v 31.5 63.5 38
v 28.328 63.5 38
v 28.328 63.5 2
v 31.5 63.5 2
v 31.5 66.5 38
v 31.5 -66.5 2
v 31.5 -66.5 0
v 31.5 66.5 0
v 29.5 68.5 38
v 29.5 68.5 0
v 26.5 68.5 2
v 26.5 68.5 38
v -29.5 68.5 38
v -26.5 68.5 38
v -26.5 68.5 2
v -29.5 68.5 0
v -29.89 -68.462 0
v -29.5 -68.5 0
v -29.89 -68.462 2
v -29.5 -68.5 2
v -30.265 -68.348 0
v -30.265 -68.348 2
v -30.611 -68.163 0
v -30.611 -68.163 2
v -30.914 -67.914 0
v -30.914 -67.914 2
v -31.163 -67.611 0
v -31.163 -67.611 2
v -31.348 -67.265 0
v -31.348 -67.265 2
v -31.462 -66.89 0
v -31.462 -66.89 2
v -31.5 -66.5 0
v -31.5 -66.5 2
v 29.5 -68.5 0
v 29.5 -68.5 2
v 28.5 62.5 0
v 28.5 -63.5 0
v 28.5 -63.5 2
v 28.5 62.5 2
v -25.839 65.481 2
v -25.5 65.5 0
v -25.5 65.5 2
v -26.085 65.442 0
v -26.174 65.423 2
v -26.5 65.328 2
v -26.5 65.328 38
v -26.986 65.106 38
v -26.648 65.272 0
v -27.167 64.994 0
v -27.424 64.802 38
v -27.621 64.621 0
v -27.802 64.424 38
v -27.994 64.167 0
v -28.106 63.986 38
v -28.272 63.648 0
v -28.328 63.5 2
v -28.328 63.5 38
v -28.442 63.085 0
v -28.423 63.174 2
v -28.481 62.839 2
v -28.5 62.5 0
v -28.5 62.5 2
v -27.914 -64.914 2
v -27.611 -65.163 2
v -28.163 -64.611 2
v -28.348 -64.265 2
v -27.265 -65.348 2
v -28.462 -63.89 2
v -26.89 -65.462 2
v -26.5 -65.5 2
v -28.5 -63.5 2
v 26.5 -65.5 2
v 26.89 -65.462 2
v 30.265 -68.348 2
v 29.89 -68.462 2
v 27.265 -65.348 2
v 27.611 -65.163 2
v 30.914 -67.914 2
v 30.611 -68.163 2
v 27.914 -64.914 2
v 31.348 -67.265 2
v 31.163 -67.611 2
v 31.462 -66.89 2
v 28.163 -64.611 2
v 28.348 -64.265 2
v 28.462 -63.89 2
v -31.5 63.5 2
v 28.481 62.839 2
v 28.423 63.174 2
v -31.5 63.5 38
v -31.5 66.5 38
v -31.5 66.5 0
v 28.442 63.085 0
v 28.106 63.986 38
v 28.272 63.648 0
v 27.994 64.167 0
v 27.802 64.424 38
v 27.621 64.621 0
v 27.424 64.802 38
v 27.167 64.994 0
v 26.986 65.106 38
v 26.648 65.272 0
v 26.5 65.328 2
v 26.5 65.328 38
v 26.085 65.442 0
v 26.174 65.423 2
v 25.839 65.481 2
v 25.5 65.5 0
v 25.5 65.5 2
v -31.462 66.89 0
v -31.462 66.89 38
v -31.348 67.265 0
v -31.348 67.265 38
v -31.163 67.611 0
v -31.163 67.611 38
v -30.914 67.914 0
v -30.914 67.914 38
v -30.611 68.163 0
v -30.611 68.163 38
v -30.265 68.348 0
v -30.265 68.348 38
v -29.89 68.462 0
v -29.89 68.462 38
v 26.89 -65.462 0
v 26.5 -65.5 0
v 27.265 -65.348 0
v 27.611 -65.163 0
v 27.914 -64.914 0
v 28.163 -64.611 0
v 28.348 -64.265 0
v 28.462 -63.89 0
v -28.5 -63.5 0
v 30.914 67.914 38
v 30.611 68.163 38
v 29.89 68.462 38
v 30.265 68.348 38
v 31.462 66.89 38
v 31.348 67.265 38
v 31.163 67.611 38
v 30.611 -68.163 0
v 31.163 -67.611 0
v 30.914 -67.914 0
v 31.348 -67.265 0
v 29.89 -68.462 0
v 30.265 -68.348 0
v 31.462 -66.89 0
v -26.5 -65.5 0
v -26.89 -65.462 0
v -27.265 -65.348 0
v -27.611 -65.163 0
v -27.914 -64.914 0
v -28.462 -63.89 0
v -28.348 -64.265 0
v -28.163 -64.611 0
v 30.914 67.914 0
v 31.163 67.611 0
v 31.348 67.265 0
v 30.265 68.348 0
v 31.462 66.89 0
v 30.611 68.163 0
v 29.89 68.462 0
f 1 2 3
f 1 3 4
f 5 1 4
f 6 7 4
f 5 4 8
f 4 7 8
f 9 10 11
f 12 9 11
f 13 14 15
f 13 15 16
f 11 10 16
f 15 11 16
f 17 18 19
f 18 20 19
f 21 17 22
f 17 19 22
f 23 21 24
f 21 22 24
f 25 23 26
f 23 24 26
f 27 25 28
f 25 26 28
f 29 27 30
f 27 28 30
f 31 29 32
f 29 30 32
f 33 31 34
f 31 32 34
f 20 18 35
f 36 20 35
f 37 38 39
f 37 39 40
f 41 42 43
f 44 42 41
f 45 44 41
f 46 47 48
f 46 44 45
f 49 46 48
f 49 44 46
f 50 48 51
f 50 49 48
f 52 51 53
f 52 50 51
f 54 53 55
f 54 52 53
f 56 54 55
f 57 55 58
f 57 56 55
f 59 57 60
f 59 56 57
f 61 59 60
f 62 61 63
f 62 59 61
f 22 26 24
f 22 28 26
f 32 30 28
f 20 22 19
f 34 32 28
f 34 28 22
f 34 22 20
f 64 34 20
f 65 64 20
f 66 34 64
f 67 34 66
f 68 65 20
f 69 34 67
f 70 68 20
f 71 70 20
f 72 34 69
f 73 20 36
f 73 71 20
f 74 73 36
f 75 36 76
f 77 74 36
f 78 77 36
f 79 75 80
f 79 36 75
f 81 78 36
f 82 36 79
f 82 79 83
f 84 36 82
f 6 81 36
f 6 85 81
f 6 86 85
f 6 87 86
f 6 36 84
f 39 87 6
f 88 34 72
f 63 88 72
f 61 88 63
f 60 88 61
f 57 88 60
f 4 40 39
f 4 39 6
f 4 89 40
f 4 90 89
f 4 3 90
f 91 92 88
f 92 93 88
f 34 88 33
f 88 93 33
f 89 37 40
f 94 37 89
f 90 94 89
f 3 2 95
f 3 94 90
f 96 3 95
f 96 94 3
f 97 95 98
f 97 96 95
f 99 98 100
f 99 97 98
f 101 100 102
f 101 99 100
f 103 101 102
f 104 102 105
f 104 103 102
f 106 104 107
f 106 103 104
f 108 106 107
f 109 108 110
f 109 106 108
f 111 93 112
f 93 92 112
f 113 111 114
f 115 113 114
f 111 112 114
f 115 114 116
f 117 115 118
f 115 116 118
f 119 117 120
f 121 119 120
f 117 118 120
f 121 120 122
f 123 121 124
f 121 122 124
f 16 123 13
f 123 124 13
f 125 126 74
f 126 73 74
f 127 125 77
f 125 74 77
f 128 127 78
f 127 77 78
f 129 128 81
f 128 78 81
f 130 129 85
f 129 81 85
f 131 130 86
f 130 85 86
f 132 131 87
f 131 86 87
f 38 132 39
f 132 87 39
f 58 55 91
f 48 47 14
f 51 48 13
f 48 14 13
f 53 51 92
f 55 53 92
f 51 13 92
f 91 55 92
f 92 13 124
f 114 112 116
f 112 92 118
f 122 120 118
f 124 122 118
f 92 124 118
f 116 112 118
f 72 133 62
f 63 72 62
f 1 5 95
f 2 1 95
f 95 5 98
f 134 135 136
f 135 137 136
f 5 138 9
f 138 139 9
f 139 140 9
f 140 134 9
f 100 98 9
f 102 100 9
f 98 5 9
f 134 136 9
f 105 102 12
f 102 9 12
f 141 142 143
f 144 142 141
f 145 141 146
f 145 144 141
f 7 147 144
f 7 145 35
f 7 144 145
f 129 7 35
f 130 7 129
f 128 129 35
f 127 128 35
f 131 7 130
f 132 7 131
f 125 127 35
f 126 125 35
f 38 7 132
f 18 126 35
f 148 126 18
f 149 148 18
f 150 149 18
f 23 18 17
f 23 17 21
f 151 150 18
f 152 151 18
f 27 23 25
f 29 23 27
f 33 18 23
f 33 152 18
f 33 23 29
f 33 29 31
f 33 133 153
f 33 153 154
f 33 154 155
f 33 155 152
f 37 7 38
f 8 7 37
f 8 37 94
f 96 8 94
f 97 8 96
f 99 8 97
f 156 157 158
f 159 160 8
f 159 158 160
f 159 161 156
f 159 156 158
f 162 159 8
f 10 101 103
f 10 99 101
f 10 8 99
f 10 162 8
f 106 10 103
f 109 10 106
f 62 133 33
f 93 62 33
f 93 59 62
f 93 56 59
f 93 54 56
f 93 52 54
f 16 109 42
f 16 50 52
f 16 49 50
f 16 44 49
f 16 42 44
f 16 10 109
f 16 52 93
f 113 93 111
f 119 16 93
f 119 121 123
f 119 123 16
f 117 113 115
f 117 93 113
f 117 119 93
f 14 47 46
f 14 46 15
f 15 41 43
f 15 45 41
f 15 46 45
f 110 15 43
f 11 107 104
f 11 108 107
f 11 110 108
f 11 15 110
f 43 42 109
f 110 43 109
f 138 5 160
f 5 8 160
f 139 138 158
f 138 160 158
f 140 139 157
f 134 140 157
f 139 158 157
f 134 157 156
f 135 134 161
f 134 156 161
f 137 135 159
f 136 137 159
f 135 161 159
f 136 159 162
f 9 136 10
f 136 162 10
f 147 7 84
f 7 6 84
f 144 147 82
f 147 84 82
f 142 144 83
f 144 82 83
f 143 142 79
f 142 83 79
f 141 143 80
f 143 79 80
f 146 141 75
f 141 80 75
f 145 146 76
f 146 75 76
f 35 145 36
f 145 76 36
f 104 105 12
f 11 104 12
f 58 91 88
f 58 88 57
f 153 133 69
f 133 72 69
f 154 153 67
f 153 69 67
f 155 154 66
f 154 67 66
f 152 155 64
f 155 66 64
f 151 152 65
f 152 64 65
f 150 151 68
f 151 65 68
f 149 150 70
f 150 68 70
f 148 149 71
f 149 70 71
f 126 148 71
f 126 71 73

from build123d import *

# Parameters (mm, degrees)
F0_W         = 63
F0_H         = 137
F0_W_2       = 57
F0_H_2       = 131
F1_DEPTH     = 2
F4_DEPTH     = 36
F5_T4_DEPTH  = 38
F5_T10_DEPTH = 38
F5_T17_DEPTH = 38
F5_T23_DEPTH = 38
F5_T30_DEPTH = 38
F5_T36_DEPTH = 38
F5_T43_DEPTH = 38
F5_T49_DEPTH = 38
F6_R         = 2


# Not quite as in the source:
# - a fillet or chamfer that OpenCascade refuses, or shapes differently, is made with other operations: its cross-section is extruded or revolved along the edge and cut away or added


with BuildPart() as f1:
    # F0 (on Top) → F1 (new body)
    with BuildSketch(Plane.XY):
        Rectangle(F0_W, F0_H)
        Rectangle(F0_W_2, F0_H_2, mode=Mode.SUBTRACT)
    extrude(amount=F1_DEPTH)

    # F3 (on face) → F4 (join, through all)
    with BuildSketch(Plane.XY.offset(2)):
        Polygon((-26.5, 68.5), (-31.5, 68.5), (-31.5, 63.5), (-28.5, 63.5), (-28.5, 65.5), (-26.5, 65.5), align=None)
        Polygon((31.5, 68.5), (26.5, 68.5), (26.5, 65.5), (28.5, 65.5), (28.5, 63.5), (31.5, 63.5), align=None)
    extrude(amount=F4_DEPTH)

    # F5: fillet of radius 3 on 2 edges, made by hand


with BuildPart() as f5_tool2:
    # F5_s3 → F5_t4 (new body)
    with BuildSketch(Plane.XY):
        with BuildLine():
            ThreePointArc((-25.5, 65.5), (-27.6213203436, 64.6213203436), (-28.5, 62.5))
            Line((-28.5, 62.5), (-28.5, 65.5))
            Line((-28.5, 65.5), (-25.5, 65.5))
        make_face()
    extrude(amount=F5_T4_DEPTH)

    split(bisect_by=Plane.XY.offset(2), keep=Keep.BOTTOM)

    split(bisect_by=Plane.YZ.offset(-26.5), keep=Keep.TOP)


with BuildPart() as f1_1:
    add(f1.part)

    # F5_t1: union F5_tool2
    add(f5_tool2.part)


with BuildPart() as f5_tool8:
    # F5_s9 → F5_t10 (new body)
    with BuildSketch(Plane.XY):
        with BuildLine():
            ThreePointArc((-25.5, 65.5), (-27.6213203436, 64.6213203436), (-28.5, 62.5))
            Line((-28.5, 62.5), (-28.5, 65.5))
            Line((-28.5, 65.5), (-25.5, 65.5))
        make_face()
    extrude(amount=F5_T10_DEPTH)

    split(bisect_by=Plane.XY.offset(2), keep=Keep.BOTTOM)

    split(bisect_by=Plane.XZ.offset(-63.5), keep=Keep.BOTTOM)

    split(bisect_by=Plane.YZ.offset(-26.5), keep=Keep.BOTTOM)


with BuildPart() as f1_2:
    add(f1_1.part)

    # F5_t7: union F5_tool8
    add(f5_tool8.part)


with BuildPart() as f5_tool15:
    # F5_s16 → F5_t17 (new body)
    with BuildSketch(Plane.XY):
        with BuildLine():
            ThreePointArc((-25.5, 65.5), (-27.6213203436, 64.6213203436), (-28.5, 62.5))
            Line((-28.5, 62.5), (-28.5, 65.5))
            Line((-28.5, 65.5), (-25.5, 65.5))
        make_face()
    extrude(amount=F5_T17_DEPTH)

    split(bisect_by=Plane.XY.offset(2), keep=Keep.BOTTOM)

    split(bisect_by=Plane.XZ.offset(-63.5), keep=Keep.TOP)


with BuildPart() as f1_3:
    add(f1_2.part)

    # F5_t14: union F5_tool15
    add(f5_tool15.part)


with BuildPart() as f5_tool21:
    # F5_s22 → F5_t23 (new body)
    with BuildSketch(Plane.XY):
        with BuildLine():
            ThreePointArc((-25.5, 65.5), (-27.6213203436, 64.6213203436), (-28.5, 62.5))
            Line((-28.5, 62.5), (-28.5, 65.5))
            Line((-28.5, 65.5), (-25.5, 65.5))
        make_face()
    extrude(amount=F5_T23_DEPTH)

    split(bisect_by=Plane.XY.offset(2), keep=Keep.TOP)

    split(bisect_by=Plane.XZ.offset(-63.5), keep=Keep.BOTTOM)

    split(bisect_by=Plane.YZ.offset(-26.5), keep=Keep.BOTTOM)


with BuildPart() as f1_4:
    add(f1_3.part)

    # F5_t20: union F5_tool21
    add(f5_tool21.part)


with BuildPart() as f5_tool28:
    # F5_s29 → F5_t30 (new body)
    with BuildSketch(Plane.XY):
        with BuildLine():
            ThreePointArc((28.5, 62.5), (27.6213203436, 64.6213203436), (25.5, 65.5))
            Line((25.5, 65.5), (28.5, 65.5))
            Line((28.5, 65.5), (28.5, 62.5))
        make_face()
    extrude(amount=F5_T30_DEPTH)

    split(bisect_by=Plane.XY.offset(2), keep=Keep.BOTTOM)

    split(bisect_by=Plane.XZ.offset(-63.5), keep=Keep.TOP)


with BuildPart() as f1_5:
    add(f1_4.part)

    # F5_t27: union F5_tool28
    add(f5_tool28.part)


with BuildPart() as f5_tool34:
    # F5_s35 → F5_t36 (new body)
    with BuildSketch(Plane.XY):
        with BuildLine():
            ThreePointArc((28.5, 62.5), (27.6213203436, 64.6213203436), (25.5, 65.5))
            Line((25.5, 65.5), (28.5, 65.5))
            Line((28.5, 65.5), (28.5, 62.5))
        make_face()
    extrude(amount=F5_T36_DEPTH)

    split(bisect_by=Plane.XY.offset(2), keep=Keep.BOTTOM)

    split(bisect_by=Plane.XZ.offset(-63.5), keep=Keep.BOTTOM)

    split(bisect_by=Plane.YZ.offset(26.5), keep=Keep.TOP)


with BuildPart() as f1_6:
    add(f1_5.part)

    # F5_t33: union F5_tool34
    add(f5_tool34.part)


with BuildPart() as f5_tool41:
    # F5_s42 → F5_t43 (new body)
    with BuildSketch(Plane.XY):
        with BuildLine():
            ThreePointArc((28.5, 62.5), (27.6213203436, 64.6213203436), (25.5, 65.5))
            Line((25.5, 65.5), (28.5, 65.5))
            Line((28.5, 65.5), (28.5, 62.5))
        make_face()
    extrude(amount=F5_T43_DEPTH)

    split(bisect_by=Plane.XY.offset(2), keep=Keep.BOTTOM)

    split(bisect_by=Plane.YZ.offset(26.5), keep=Keep.BOTTOM)


with BuildPart() as f1_7:
    add(f1_6.part)

    # F5_t40: union F5_tool41
    add(f5_tool41.part)


with BuildPart() as f5_tool47:
    # F5_s48 → F5_t49 (new body)
    with BuildSketch(Plane.XY):
        with BuildLine():
            ThreePointArc((28.5, 62.5), (27.6213203436, 64.6213203436), (25.5, 65.5))
            Line((25.5, 65.5), (28.5, 65.5))
            Line((28.5, 65.5), (28.5, 62.5))
        make_face()
    extrude(amount=F5_T49_DEPTH)

    split(bisect_by=Plane.XY.offset(2), keep=Keep.TOP)

    split(bisect_by=Plane.XZ.offset(-63.5), keep=Keep.BOTTOM)

    split(bisect_by=Plane.YZ.offset(26.5), keep=Keep.TOP)


with BuildPart() as f1_8:
    add(f1_7.part)

    # F5_t46: union F5_tool47
    add(f5_tool47.part)

    # F6
    f6_edges = [f1_8.edges().sort_by_distance(p)[0] for p in [
        (-31.5, 68.5, 19),
        (31.5, 68.5, 19),
        (31.5, -68.5, 1),
        (-31.5, -68.5, 1),
        (28.5, -65.5, 1),
        (-28.5, -65.5, 1),
    ]]
    fillet(f6_edges, radius=F6_R)


solid = f1_8.part
